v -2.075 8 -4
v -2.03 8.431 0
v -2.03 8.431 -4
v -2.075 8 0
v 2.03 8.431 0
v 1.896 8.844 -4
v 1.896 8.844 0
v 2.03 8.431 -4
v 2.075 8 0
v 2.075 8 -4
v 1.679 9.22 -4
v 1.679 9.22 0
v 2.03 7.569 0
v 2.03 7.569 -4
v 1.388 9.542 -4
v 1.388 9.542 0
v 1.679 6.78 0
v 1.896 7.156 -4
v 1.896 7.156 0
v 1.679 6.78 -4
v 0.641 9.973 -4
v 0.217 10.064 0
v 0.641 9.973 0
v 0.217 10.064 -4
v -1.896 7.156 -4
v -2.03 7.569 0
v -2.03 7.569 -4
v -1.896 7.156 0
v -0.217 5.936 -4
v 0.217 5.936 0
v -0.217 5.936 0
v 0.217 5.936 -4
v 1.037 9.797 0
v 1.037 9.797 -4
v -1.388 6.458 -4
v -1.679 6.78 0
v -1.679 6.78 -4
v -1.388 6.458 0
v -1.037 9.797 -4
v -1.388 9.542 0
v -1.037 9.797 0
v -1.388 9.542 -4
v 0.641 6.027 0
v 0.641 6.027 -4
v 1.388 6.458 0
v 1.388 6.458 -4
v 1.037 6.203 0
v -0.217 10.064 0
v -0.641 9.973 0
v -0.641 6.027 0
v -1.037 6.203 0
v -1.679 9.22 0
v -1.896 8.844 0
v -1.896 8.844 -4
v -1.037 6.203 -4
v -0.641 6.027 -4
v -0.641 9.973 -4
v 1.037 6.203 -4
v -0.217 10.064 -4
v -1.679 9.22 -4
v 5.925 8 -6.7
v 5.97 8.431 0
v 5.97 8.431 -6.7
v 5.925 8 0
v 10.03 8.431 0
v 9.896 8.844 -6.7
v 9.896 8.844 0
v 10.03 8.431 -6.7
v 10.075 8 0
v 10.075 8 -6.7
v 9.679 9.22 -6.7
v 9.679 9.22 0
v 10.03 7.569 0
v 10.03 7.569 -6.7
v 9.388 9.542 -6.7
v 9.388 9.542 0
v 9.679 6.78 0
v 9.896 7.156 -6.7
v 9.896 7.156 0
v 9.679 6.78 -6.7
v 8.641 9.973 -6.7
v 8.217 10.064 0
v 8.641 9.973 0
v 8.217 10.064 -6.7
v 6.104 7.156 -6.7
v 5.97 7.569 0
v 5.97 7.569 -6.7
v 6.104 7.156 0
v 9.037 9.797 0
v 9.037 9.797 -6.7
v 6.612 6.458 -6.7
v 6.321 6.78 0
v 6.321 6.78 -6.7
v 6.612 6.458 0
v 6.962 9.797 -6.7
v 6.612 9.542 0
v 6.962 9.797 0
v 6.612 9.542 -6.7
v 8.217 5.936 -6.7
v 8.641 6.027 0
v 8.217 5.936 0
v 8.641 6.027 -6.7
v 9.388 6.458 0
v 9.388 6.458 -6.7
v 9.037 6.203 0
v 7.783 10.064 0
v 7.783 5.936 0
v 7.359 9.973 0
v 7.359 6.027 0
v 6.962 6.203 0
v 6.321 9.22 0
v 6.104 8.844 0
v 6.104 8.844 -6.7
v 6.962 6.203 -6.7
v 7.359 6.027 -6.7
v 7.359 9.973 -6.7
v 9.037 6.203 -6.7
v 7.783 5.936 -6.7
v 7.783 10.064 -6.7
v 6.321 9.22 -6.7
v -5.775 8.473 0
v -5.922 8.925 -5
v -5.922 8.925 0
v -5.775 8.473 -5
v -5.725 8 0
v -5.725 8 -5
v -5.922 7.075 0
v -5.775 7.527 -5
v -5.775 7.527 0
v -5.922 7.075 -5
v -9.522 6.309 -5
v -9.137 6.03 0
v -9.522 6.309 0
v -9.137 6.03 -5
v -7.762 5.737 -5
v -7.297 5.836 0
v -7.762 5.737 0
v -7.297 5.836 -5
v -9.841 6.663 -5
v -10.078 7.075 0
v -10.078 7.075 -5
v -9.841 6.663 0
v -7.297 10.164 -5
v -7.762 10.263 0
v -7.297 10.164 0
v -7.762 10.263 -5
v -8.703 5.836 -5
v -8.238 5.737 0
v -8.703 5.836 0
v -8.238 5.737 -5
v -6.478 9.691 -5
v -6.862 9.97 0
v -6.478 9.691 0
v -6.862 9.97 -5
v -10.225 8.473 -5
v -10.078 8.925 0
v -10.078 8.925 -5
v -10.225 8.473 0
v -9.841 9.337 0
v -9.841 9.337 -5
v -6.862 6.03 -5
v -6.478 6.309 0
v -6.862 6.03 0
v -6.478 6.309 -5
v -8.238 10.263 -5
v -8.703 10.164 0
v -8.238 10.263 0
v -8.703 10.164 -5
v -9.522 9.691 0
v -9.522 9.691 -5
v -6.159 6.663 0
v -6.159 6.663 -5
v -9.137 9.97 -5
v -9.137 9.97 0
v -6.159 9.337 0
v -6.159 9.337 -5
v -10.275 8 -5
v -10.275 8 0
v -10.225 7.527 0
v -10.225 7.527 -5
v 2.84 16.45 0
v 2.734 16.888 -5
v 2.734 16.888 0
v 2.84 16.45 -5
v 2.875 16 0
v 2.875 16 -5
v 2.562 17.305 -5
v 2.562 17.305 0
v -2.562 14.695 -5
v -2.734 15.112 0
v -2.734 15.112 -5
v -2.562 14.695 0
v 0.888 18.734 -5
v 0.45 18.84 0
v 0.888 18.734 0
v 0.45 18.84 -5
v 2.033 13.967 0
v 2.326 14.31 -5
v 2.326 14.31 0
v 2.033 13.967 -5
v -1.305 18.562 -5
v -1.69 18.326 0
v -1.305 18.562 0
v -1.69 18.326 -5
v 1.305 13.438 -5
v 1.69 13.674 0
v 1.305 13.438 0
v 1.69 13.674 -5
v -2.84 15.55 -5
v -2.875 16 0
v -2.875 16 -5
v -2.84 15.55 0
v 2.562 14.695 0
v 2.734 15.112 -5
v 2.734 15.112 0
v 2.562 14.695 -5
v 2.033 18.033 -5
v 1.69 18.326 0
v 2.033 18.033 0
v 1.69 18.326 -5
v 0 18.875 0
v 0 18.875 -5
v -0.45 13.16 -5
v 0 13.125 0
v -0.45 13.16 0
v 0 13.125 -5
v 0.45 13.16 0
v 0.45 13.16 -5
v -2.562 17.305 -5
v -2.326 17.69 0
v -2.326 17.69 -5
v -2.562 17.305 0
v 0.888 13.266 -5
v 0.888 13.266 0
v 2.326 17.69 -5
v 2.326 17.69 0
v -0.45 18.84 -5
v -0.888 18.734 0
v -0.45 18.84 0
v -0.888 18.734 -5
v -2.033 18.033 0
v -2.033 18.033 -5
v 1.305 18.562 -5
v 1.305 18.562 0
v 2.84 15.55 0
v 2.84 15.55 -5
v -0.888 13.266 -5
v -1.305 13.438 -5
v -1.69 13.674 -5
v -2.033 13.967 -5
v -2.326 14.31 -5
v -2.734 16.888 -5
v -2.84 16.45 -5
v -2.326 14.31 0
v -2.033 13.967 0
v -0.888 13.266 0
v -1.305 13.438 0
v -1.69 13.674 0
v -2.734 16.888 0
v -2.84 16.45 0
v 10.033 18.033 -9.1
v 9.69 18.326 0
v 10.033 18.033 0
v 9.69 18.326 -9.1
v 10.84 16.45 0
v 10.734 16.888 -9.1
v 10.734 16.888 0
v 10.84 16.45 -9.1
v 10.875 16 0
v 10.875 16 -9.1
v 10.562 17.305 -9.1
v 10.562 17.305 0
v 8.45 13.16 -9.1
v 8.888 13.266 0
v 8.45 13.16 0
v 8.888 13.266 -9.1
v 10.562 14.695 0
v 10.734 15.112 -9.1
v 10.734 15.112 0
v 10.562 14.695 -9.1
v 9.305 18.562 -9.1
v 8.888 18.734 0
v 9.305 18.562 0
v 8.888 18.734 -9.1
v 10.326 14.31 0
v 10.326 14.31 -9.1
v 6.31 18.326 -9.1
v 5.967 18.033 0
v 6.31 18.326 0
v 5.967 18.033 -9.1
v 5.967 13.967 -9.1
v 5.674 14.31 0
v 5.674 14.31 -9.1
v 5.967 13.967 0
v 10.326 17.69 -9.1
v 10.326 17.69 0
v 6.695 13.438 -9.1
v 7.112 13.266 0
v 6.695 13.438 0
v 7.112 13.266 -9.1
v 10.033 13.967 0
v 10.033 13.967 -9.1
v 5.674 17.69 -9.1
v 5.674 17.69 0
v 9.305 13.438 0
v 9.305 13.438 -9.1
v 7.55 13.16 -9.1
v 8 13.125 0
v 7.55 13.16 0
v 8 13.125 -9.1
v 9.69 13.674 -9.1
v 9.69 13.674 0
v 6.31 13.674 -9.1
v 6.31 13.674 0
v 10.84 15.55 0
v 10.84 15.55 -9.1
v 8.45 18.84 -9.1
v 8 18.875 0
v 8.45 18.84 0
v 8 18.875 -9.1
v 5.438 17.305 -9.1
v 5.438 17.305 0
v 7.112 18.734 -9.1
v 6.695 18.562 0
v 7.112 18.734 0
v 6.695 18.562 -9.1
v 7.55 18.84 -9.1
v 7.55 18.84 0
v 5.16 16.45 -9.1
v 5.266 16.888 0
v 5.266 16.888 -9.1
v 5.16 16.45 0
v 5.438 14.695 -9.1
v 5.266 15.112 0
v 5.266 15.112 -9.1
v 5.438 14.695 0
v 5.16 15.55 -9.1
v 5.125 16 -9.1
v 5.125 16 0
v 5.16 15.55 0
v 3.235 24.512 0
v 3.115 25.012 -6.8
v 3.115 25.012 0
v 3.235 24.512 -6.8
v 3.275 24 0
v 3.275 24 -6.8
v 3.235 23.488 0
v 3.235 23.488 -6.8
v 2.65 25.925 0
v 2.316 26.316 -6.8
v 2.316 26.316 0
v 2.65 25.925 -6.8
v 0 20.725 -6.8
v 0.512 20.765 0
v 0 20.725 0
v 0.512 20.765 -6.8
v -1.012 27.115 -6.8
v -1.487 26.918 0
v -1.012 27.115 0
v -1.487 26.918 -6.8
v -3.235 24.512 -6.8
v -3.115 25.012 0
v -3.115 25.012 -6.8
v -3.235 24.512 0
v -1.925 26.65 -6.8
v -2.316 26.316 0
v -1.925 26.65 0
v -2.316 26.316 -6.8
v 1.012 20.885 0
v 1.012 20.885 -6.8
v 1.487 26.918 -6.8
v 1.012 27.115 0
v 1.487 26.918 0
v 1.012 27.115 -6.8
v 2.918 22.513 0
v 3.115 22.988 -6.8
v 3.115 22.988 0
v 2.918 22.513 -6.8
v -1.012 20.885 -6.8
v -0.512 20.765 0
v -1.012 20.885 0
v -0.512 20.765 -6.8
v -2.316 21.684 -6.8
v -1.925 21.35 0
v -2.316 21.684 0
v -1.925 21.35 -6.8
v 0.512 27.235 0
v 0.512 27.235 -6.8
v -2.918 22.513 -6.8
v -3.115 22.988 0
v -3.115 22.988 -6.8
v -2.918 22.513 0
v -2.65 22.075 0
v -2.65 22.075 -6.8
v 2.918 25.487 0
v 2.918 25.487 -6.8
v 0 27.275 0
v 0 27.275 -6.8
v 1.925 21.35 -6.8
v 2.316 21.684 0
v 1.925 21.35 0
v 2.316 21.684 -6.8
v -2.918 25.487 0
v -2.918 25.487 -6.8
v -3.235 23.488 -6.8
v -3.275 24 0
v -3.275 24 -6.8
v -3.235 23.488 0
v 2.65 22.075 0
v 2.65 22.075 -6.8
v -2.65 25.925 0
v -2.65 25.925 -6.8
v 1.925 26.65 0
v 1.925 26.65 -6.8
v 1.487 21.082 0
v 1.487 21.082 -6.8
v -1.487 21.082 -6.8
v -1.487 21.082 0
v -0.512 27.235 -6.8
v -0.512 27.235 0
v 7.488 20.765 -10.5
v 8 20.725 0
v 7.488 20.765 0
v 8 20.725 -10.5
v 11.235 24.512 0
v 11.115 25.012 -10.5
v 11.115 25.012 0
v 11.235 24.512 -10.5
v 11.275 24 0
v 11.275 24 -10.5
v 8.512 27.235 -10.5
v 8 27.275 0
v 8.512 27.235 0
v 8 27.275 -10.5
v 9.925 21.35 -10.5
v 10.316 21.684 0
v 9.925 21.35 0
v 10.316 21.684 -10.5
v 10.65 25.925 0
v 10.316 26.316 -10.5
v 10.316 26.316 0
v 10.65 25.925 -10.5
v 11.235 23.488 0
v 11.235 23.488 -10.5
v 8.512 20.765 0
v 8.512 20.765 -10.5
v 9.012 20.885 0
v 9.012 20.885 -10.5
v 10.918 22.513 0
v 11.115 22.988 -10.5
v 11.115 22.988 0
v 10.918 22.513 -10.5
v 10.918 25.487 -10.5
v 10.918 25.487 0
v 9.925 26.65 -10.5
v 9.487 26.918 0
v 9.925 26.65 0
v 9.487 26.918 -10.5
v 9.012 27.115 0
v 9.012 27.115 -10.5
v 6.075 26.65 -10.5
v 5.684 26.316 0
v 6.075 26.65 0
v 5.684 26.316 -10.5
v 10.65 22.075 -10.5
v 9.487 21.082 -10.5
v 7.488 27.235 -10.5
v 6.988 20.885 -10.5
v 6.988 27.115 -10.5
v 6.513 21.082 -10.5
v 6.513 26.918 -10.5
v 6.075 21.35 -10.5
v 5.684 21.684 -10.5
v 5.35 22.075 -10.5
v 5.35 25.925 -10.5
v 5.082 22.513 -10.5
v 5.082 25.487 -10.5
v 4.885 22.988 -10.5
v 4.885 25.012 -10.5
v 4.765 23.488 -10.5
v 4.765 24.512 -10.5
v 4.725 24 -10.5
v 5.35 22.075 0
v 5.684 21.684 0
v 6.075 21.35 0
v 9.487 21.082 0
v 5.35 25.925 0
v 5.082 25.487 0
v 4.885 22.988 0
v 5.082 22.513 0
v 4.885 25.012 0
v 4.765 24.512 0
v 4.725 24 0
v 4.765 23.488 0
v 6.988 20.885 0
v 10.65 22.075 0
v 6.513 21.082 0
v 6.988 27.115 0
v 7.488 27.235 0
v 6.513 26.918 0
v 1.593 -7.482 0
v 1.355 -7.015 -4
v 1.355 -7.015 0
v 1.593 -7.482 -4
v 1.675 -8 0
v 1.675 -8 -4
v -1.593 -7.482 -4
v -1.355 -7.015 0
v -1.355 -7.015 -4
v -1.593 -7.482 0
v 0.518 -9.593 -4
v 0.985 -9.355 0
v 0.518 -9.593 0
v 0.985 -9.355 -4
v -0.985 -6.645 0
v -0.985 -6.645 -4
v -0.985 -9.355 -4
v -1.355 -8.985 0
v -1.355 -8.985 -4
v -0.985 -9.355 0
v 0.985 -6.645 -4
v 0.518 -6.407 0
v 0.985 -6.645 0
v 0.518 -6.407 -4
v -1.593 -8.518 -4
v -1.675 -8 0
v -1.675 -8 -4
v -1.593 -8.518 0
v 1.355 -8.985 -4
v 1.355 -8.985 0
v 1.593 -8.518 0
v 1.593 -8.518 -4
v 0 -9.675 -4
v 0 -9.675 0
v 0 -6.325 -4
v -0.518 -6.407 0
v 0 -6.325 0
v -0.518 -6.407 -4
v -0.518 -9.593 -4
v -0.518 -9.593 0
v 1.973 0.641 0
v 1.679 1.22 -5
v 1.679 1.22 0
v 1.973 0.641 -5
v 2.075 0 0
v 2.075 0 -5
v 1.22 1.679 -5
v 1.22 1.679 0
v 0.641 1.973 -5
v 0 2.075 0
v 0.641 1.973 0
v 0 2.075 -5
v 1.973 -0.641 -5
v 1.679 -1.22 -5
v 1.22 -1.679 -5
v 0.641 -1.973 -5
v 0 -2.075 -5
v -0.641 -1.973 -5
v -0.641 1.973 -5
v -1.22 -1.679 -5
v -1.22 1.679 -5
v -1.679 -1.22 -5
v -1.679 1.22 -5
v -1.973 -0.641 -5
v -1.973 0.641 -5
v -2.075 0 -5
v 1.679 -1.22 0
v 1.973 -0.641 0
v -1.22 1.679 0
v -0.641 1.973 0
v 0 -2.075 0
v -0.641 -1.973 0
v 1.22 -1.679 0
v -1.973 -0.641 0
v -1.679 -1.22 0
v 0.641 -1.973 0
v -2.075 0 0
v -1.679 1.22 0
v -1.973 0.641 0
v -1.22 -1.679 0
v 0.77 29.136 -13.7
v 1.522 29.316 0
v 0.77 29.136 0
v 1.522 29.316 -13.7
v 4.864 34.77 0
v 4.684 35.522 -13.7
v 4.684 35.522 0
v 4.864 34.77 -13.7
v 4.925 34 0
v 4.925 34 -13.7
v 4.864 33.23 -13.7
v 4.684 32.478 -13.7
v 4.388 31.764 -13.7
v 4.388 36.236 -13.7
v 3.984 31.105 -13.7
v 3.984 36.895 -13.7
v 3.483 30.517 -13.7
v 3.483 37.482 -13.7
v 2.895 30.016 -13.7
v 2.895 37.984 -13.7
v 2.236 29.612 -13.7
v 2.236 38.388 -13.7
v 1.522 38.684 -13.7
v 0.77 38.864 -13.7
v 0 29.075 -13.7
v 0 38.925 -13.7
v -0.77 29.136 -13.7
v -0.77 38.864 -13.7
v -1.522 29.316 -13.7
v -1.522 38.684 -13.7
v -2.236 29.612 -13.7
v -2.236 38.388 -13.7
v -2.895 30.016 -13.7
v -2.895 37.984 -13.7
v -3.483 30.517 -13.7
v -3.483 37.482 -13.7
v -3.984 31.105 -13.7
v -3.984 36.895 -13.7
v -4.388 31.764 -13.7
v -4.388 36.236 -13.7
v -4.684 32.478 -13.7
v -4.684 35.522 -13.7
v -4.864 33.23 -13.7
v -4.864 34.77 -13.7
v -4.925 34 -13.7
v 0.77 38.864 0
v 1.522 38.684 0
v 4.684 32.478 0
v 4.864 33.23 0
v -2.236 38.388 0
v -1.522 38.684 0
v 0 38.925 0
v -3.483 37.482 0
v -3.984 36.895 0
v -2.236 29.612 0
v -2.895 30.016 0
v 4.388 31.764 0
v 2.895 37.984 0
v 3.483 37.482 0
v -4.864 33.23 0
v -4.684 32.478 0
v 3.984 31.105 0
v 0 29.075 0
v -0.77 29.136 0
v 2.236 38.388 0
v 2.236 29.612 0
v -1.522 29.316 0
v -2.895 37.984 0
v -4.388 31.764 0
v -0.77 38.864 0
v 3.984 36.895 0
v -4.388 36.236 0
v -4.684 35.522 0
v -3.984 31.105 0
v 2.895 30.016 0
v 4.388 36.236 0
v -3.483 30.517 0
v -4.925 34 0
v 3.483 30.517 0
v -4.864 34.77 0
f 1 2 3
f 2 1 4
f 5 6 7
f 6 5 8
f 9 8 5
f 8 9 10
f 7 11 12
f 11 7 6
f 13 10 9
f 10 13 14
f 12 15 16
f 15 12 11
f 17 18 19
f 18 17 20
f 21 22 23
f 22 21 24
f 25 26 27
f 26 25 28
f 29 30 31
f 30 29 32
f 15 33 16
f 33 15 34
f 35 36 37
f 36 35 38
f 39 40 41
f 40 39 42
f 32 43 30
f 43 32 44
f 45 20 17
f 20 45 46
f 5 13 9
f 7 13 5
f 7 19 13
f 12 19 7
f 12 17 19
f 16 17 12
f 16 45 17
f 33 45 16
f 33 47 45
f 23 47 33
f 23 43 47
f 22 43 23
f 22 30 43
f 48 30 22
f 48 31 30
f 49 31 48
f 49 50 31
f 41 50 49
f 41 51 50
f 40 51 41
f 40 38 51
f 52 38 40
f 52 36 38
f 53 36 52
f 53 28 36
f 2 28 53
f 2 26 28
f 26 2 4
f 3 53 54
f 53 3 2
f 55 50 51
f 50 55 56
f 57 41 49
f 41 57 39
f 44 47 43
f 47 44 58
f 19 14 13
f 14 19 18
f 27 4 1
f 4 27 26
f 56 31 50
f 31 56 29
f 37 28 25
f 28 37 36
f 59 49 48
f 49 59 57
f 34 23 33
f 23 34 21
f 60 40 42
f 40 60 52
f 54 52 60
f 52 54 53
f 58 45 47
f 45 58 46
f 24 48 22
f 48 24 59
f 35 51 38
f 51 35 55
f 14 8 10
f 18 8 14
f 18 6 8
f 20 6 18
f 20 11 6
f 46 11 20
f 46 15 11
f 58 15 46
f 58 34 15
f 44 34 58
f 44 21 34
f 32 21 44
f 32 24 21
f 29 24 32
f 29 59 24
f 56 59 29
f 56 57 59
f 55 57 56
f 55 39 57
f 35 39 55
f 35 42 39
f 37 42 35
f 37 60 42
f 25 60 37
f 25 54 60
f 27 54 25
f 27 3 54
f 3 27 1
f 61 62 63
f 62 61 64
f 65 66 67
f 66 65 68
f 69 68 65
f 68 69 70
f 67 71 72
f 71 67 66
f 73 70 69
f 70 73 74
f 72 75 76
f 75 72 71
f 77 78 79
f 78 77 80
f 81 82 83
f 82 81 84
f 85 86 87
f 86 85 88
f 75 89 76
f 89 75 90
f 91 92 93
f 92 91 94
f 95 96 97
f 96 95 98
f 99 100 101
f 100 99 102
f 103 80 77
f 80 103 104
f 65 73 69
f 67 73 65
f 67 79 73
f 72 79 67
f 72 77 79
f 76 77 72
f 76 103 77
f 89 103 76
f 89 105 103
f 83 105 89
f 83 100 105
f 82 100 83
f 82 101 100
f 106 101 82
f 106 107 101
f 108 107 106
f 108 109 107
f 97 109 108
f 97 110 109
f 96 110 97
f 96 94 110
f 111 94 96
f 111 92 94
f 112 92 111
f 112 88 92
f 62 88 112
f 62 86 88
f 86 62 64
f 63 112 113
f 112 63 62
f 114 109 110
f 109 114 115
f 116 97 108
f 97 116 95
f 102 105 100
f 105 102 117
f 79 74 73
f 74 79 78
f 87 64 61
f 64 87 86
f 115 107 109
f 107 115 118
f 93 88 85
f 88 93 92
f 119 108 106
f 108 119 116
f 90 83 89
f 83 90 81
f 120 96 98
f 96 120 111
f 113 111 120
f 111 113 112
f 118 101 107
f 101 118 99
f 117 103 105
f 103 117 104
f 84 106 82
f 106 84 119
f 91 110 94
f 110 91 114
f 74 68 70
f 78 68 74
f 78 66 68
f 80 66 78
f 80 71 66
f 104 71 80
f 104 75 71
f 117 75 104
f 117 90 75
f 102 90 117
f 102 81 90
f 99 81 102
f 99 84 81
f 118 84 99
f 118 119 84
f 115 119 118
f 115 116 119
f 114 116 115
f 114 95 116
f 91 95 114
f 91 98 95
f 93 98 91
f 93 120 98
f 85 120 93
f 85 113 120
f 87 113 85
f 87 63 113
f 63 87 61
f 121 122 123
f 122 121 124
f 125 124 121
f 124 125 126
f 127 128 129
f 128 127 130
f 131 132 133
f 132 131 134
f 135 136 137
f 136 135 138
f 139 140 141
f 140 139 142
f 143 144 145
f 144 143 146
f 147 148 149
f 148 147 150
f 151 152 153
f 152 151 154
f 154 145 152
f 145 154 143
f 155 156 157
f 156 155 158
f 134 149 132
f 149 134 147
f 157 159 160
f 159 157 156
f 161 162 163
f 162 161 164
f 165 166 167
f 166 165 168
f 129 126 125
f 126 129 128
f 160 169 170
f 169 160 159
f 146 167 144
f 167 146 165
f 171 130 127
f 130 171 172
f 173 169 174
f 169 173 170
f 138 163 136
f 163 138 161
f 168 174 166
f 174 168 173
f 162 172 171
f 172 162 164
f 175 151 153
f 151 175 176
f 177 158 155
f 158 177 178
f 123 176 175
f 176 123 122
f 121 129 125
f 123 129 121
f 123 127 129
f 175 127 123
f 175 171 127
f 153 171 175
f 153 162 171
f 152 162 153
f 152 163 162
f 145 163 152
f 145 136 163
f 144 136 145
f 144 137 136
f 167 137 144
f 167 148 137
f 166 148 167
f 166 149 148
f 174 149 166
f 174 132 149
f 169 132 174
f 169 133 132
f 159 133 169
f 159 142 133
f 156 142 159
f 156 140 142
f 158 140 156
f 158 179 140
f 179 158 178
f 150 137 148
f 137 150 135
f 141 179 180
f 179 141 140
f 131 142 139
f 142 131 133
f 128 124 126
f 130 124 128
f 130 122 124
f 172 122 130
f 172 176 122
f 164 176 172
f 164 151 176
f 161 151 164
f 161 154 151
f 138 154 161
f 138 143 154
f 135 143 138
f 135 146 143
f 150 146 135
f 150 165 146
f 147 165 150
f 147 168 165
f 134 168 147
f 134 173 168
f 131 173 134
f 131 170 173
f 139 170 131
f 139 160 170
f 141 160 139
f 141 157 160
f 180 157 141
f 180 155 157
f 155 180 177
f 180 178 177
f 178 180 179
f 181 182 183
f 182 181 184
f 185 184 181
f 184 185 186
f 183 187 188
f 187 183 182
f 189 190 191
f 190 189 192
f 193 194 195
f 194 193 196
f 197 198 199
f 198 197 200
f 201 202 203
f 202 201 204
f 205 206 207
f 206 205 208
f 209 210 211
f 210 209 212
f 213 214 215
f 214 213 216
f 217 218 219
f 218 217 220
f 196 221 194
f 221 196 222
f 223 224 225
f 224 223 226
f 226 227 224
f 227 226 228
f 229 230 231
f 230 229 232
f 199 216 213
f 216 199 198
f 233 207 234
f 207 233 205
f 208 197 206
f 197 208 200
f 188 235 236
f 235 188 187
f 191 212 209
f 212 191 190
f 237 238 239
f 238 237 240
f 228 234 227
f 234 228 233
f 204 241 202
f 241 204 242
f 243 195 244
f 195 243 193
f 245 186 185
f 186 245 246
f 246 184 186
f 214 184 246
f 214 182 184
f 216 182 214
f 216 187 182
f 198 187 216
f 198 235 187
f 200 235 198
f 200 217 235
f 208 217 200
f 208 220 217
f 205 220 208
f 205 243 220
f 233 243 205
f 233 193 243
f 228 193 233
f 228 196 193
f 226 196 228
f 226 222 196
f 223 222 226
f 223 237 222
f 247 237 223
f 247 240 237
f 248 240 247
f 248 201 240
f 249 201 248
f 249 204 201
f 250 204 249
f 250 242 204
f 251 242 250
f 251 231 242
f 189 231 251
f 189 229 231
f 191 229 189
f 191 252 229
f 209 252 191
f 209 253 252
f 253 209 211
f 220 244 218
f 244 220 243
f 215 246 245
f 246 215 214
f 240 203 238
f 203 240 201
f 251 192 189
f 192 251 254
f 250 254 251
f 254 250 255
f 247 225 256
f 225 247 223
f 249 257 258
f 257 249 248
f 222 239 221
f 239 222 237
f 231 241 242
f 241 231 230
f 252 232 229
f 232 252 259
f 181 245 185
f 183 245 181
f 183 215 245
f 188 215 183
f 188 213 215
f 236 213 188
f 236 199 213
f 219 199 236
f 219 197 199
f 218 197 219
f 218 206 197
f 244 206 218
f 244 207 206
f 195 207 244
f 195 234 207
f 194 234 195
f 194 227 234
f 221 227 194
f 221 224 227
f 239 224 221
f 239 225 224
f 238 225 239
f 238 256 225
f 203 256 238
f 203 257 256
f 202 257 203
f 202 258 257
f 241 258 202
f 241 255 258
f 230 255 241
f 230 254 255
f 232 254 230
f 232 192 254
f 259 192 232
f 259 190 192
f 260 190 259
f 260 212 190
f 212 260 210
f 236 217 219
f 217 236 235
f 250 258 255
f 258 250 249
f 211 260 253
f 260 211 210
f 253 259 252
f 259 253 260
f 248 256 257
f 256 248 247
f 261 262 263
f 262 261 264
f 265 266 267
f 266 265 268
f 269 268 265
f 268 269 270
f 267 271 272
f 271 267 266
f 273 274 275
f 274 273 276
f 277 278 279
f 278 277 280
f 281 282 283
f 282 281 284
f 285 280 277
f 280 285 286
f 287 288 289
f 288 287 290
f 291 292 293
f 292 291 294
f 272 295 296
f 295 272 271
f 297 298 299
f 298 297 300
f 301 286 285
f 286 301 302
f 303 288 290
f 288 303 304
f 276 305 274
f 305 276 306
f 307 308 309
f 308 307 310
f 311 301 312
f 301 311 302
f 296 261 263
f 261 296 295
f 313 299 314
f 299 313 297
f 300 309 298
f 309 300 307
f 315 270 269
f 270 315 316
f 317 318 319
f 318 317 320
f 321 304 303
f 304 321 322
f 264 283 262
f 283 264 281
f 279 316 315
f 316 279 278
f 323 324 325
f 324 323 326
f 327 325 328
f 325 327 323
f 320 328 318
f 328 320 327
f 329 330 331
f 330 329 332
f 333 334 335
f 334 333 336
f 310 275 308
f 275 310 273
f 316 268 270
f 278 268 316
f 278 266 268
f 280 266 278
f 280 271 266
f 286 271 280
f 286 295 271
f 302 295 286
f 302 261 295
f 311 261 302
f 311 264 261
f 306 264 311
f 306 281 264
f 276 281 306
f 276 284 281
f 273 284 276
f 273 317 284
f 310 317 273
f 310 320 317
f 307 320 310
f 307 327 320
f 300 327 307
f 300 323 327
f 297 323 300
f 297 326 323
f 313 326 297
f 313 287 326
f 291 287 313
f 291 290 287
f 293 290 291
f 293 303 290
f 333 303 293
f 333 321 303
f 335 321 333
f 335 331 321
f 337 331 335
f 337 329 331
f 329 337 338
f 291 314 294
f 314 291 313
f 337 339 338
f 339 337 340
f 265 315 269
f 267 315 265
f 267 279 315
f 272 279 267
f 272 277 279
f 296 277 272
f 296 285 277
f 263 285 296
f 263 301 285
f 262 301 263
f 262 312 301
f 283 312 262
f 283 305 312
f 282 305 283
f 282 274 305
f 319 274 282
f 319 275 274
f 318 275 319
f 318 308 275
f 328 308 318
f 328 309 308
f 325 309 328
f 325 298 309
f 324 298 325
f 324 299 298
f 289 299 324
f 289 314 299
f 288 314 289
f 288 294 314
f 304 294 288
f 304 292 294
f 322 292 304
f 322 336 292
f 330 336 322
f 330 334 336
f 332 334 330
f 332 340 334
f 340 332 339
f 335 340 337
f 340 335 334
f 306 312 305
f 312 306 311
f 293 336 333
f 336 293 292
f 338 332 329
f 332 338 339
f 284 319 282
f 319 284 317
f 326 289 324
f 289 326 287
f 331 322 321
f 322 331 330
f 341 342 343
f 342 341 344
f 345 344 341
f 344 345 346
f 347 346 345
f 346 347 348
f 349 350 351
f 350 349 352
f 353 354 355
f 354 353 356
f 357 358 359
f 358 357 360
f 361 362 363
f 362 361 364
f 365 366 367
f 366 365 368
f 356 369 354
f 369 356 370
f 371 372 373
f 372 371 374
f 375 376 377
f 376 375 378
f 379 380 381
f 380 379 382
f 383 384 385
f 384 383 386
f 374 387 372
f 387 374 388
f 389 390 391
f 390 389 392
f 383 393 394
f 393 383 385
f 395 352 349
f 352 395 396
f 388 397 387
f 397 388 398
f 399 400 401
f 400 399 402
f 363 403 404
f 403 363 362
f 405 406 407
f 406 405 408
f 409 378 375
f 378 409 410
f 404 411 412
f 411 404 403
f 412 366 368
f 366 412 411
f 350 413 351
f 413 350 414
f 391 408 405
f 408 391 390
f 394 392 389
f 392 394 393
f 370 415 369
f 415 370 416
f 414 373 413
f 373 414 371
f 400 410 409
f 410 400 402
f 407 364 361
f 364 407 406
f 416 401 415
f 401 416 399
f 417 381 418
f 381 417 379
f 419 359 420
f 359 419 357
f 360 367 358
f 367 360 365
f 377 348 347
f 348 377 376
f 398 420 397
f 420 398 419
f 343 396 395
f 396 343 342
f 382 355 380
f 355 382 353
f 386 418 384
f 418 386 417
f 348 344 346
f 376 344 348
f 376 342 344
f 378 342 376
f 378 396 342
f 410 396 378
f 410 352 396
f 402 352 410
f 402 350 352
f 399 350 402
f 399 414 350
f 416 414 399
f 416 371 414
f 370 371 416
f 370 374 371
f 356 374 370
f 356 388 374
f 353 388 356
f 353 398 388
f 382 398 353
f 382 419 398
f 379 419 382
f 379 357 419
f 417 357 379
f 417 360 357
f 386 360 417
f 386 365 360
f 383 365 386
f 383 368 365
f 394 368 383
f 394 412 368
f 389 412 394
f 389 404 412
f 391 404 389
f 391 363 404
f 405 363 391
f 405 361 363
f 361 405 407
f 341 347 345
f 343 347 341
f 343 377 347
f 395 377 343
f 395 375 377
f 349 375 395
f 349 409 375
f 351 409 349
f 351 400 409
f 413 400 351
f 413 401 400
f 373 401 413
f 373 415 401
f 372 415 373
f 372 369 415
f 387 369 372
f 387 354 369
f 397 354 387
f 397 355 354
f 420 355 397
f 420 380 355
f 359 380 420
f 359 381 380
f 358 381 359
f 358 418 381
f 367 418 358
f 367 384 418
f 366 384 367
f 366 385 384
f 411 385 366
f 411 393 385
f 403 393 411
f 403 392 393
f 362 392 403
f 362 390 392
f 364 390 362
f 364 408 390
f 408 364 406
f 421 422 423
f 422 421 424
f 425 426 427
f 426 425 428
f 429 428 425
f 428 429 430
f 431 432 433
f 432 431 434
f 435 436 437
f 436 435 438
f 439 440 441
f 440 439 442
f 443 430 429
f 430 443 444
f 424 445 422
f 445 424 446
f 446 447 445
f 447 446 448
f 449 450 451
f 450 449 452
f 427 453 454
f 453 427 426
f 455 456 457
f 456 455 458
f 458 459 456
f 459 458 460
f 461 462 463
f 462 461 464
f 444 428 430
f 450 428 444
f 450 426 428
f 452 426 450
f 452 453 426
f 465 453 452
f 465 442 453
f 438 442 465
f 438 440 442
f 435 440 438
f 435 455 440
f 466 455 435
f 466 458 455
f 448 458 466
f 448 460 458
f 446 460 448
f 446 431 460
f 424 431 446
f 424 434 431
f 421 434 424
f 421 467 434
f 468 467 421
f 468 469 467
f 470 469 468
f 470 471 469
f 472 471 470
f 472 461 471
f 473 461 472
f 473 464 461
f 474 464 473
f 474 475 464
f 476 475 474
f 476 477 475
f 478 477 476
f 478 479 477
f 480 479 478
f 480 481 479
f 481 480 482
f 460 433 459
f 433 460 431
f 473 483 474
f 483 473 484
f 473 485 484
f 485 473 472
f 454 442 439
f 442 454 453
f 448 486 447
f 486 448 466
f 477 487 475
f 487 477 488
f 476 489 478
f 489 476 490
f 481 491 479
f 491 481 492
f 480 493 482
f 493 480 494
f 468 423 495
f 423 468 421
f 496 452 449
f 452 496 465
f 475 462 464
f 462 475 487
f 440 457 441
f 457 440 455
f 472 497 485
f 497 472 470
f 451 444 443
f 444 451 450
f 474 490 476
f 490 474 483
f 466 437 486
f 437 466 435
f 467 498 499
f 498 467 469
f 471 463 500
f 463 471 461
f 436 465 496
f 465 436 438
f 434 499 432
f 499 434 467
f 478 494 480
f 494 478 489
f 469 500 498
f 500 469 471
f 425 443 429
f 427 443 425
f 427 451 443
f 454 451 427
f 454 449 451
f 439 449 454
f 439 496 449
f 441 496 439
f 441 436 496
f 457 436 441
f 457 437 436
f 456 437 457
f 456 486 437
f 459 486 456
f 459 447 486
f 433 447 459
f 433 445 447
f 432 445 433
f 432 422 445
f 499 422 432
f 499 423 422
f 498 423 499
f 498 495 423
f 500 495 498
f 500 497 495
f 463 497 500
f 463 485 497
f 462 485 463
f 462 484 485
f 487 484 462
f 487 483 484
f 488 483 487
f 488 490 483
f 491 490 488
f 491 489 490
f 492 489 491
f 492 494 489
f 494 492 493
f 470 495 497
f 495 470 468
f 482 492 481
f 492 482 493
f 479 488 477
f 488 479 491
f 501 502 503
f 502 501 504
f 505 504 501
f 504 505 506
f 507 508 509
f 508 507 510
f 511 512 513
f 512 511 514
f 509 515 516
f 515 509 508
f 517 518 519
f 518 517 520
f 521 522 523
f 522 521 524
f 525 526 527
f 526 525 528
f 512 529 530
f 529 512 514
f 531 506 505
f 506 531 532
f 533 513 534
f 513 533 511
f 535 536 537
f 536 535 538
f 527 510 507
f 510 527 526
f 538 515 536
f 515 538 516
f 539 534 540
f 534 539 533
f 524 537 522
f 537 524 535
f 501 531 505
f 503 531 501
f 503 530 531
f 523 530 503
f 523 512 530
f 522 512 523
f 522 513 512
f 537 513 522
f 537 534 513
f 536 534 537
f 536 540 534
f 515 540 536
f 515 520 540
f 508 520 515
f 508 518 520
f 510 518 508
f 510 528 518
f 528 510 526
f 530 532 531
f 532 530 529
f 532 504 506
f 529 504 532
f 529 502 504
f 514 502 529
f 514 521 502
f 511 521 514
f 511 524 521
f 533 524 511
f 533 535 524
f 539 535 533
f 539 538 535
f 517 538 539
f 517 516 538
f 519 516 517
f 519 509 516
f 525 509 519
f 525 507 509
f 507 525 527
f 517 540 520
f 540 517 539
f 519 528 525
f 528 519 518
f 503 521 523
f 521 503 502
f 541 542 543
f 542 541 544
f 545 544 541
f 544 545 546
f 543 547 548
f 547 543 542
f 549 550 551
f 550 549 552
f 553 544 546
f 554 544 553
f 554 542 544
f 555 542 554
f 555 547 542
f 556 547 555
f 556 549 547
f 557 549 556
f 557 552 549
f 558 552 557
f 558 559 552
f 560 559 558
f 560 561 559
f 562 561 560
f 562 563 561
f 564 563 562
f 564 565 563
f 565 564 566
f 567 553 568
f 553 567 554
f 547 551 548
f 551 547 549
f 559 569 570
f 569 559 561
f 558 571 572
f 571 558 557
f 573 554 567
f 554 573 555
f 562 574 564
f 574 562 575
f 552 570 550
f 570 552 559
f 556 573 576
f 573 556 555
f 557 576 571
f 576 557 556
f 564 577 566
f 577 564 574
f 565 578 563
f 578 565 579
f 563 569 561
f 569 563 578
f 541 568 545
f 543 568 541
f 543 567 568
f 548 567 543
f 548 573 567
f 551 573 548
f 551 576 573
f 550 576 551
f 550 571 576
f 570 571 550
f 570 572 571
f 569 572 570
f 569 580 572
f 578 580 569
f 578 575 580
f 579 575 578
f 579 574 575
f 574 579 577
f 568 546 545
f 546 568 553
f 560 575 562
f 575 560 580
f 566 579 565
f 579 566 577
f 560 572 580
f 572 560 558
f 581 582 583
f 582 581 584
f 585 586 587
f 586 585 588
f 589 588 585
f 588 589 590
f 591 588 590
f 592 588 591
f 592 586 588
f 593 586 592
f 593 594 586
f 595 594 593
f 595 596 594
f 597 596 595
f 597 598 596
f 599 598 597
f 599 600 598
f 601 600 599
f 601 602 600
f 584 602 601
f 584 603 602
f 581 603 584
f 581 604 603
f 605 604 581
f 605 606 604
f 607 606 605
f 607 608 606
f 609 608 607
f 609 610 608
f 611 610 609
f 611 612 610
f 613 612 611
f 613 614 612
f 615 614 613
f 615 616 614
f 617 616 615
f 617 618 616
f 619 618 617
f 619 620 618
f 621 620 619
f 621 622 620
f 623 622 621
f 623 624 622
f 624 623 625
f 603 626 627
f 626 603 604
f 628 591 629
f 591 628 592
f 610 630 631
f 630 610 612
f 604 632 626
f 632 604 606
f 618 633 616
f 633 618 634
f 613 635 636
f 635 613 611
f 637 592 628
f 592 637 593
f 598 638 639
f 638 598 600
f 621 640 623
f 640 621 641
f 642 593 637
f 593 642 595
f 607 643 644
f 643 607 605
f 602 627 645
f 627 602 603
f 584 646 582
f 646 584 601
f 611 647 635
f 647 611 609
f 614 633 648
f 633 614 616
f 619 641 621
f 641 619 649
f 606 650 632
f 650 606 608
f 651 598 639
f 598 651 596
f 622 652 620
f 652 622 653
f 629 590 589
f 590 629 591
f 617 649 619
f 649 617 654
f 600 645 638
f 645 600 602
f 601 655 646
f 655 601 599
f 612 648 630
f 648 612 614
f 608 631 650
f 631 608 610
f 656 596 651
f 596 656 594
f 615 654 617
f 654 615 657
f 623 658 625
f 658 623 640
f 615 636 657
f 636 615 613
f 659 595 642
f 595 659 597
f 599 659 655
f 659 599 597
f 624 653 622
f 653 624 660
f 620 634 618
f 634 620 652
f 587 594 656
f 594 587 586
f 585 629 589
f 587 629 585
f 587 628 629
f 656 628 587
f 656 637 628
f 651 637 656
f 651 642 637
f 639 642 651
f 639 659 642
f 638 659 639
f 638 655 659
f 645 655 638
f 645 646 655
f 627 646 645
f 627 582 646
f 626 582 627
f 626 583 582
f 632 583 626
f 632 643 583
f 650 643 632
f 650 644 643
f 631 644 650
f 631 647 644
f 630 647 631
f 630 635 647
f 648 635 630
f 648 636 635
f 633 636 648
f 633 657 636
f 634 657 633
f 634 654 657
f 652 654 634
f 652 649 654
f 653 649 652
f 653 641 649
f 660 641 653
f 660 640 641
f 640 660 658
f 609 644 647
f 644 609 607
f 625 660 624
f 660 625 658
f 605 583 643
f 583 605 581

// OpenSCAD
// file: ../fn.scad
// return:
// x - for small values
// some fraction of x (>=16) - for larger values
function fn_preview_(x) = min( max(16, 0.2*x), x );
assert( fn_preview_(10) == 10 );
assert( fn_preview_(16) == 16 );
assert( fn_preview_(90)  > 16 );

// helper functions to define $fn=... to do less precise math
// in a preview mode. example usage:
//   sphere(r=50, $fn=fn(1000));
// would generate $fn=1000 when generating model, but $fn < 1000
// for preview mode. note that for small $fn's value is untouched.
function fn(x) = $preview ? fn_preview_(x) : x;
// main file
// threaded inserts from CNC Kitchen's store:
// https://cnckitchen.store
use <../fn.scad>


// M2 x 3.0
module ti_cnck_m2(dl=0, dd=0.15)
{
  translate([0, 0, -4.0-dl])
    cylinder(d=3.2+dd, h=4.0+dl, $fn=fn(20));
}


// M2.5 x 4.0
module ti_cnck_m2_5(dl=0, dd=0.15)
{
  translate([0, 0, -5.0-dl])
    cylinder(d=4.0+dd, h=5.0+dl, $fn=fn(20));
}


// M3 x 3.0
module ti_cnck_m3_short(dl=0, dd=0.15)
{
  translate([0, 0, -4.0-dl])
    cylinder(d=4.0+dd, h=4.0+dl, $fn=fn(30));
}

// M3 x 5.7
module ti_cnck_m3_standard(dl=0, dd=0.15)
{
  translate([0, 0, -6.7-dl])
    cylinder(d=4.0+dd, h=6.7+dl, $fn=fn(30));
}

// M3 x 5 x 4 (for Voron)
module ti_cnck_m3_voron(dl=0, dd=0.15)
{
  translate([0, 0, -5.0-dl])
    cylinder(d=4.4+dd, h=5.0+dl, $fn=fn(30));
}


// M4 x 4.0
module ti_cnck_m4_short(dl=0, dd=0.15)
{
  translate([0, 0, -5.0-dl])
    cylinder(d=5.6+dd, h=5.0+dl, $fn=fn(40));
}

// M4 x 8.1
module ti_cnck_m4_standard(dl=0, dd=0.15)
{
  translate([0, 0, -9.1-dl])
    cylinder(d=5.6+dd, h=9.1+dl, $fn=fn(40));
}


// M5 x 5.8
module ti_cnck_m5_short(dl=0, dd=0.15)
{
  translate([0, 0, -6.8-dl])
    cylinder(d=6.4+dd, h=6.8+dl, $fn=fn(40));
}

// M5 x 9.5
module ti_cnck_m5_standard(dl=0, dd=0.15)
{
  translate([0, 0, -10.5-dl])
    cylinder(d=6.4+dd, h=10.5+dl, $fn=fn(40));
}


// M8 x 12.7
module ti_cnck_m8(dl=0, dd=0.15)
{
  translate([0, 0, -13.7-dl])
    cylinder(d=9.7+dd, h=13.7+dl, $fn=fn(40));
}


////////////////////////////////////////////////////////////////


// M2 preview
translate([0, -1*8, 0])
  ti_cnck_m2();

// M2.5 preview
ti_cnck_m2_5();

// M3 preview
translate([0, 1*8, 0])
{
  ti_cnck_m3_short();
  translate([+8, 0, 0])
    ti_cnck_m3_standard();
  translate([-8, 0, 0])
    ti_cnck_m3_voron();
}

// M4 preview
translate([0, 2*8, 0])
{
  ti_cnck_m4_short();
  translate([8, 0, 0])
    ti_cnck_m4_standard();
}

// M5 preview
translate([0, 3*8, 0])
{
  ti_cnck_m5_short();
  translate([8, 0, 0])
    ti_cnck_m5_standard();
}

// M8 preview
translate([0, 4*8+2, 0])
  ti_cnck_m8();
